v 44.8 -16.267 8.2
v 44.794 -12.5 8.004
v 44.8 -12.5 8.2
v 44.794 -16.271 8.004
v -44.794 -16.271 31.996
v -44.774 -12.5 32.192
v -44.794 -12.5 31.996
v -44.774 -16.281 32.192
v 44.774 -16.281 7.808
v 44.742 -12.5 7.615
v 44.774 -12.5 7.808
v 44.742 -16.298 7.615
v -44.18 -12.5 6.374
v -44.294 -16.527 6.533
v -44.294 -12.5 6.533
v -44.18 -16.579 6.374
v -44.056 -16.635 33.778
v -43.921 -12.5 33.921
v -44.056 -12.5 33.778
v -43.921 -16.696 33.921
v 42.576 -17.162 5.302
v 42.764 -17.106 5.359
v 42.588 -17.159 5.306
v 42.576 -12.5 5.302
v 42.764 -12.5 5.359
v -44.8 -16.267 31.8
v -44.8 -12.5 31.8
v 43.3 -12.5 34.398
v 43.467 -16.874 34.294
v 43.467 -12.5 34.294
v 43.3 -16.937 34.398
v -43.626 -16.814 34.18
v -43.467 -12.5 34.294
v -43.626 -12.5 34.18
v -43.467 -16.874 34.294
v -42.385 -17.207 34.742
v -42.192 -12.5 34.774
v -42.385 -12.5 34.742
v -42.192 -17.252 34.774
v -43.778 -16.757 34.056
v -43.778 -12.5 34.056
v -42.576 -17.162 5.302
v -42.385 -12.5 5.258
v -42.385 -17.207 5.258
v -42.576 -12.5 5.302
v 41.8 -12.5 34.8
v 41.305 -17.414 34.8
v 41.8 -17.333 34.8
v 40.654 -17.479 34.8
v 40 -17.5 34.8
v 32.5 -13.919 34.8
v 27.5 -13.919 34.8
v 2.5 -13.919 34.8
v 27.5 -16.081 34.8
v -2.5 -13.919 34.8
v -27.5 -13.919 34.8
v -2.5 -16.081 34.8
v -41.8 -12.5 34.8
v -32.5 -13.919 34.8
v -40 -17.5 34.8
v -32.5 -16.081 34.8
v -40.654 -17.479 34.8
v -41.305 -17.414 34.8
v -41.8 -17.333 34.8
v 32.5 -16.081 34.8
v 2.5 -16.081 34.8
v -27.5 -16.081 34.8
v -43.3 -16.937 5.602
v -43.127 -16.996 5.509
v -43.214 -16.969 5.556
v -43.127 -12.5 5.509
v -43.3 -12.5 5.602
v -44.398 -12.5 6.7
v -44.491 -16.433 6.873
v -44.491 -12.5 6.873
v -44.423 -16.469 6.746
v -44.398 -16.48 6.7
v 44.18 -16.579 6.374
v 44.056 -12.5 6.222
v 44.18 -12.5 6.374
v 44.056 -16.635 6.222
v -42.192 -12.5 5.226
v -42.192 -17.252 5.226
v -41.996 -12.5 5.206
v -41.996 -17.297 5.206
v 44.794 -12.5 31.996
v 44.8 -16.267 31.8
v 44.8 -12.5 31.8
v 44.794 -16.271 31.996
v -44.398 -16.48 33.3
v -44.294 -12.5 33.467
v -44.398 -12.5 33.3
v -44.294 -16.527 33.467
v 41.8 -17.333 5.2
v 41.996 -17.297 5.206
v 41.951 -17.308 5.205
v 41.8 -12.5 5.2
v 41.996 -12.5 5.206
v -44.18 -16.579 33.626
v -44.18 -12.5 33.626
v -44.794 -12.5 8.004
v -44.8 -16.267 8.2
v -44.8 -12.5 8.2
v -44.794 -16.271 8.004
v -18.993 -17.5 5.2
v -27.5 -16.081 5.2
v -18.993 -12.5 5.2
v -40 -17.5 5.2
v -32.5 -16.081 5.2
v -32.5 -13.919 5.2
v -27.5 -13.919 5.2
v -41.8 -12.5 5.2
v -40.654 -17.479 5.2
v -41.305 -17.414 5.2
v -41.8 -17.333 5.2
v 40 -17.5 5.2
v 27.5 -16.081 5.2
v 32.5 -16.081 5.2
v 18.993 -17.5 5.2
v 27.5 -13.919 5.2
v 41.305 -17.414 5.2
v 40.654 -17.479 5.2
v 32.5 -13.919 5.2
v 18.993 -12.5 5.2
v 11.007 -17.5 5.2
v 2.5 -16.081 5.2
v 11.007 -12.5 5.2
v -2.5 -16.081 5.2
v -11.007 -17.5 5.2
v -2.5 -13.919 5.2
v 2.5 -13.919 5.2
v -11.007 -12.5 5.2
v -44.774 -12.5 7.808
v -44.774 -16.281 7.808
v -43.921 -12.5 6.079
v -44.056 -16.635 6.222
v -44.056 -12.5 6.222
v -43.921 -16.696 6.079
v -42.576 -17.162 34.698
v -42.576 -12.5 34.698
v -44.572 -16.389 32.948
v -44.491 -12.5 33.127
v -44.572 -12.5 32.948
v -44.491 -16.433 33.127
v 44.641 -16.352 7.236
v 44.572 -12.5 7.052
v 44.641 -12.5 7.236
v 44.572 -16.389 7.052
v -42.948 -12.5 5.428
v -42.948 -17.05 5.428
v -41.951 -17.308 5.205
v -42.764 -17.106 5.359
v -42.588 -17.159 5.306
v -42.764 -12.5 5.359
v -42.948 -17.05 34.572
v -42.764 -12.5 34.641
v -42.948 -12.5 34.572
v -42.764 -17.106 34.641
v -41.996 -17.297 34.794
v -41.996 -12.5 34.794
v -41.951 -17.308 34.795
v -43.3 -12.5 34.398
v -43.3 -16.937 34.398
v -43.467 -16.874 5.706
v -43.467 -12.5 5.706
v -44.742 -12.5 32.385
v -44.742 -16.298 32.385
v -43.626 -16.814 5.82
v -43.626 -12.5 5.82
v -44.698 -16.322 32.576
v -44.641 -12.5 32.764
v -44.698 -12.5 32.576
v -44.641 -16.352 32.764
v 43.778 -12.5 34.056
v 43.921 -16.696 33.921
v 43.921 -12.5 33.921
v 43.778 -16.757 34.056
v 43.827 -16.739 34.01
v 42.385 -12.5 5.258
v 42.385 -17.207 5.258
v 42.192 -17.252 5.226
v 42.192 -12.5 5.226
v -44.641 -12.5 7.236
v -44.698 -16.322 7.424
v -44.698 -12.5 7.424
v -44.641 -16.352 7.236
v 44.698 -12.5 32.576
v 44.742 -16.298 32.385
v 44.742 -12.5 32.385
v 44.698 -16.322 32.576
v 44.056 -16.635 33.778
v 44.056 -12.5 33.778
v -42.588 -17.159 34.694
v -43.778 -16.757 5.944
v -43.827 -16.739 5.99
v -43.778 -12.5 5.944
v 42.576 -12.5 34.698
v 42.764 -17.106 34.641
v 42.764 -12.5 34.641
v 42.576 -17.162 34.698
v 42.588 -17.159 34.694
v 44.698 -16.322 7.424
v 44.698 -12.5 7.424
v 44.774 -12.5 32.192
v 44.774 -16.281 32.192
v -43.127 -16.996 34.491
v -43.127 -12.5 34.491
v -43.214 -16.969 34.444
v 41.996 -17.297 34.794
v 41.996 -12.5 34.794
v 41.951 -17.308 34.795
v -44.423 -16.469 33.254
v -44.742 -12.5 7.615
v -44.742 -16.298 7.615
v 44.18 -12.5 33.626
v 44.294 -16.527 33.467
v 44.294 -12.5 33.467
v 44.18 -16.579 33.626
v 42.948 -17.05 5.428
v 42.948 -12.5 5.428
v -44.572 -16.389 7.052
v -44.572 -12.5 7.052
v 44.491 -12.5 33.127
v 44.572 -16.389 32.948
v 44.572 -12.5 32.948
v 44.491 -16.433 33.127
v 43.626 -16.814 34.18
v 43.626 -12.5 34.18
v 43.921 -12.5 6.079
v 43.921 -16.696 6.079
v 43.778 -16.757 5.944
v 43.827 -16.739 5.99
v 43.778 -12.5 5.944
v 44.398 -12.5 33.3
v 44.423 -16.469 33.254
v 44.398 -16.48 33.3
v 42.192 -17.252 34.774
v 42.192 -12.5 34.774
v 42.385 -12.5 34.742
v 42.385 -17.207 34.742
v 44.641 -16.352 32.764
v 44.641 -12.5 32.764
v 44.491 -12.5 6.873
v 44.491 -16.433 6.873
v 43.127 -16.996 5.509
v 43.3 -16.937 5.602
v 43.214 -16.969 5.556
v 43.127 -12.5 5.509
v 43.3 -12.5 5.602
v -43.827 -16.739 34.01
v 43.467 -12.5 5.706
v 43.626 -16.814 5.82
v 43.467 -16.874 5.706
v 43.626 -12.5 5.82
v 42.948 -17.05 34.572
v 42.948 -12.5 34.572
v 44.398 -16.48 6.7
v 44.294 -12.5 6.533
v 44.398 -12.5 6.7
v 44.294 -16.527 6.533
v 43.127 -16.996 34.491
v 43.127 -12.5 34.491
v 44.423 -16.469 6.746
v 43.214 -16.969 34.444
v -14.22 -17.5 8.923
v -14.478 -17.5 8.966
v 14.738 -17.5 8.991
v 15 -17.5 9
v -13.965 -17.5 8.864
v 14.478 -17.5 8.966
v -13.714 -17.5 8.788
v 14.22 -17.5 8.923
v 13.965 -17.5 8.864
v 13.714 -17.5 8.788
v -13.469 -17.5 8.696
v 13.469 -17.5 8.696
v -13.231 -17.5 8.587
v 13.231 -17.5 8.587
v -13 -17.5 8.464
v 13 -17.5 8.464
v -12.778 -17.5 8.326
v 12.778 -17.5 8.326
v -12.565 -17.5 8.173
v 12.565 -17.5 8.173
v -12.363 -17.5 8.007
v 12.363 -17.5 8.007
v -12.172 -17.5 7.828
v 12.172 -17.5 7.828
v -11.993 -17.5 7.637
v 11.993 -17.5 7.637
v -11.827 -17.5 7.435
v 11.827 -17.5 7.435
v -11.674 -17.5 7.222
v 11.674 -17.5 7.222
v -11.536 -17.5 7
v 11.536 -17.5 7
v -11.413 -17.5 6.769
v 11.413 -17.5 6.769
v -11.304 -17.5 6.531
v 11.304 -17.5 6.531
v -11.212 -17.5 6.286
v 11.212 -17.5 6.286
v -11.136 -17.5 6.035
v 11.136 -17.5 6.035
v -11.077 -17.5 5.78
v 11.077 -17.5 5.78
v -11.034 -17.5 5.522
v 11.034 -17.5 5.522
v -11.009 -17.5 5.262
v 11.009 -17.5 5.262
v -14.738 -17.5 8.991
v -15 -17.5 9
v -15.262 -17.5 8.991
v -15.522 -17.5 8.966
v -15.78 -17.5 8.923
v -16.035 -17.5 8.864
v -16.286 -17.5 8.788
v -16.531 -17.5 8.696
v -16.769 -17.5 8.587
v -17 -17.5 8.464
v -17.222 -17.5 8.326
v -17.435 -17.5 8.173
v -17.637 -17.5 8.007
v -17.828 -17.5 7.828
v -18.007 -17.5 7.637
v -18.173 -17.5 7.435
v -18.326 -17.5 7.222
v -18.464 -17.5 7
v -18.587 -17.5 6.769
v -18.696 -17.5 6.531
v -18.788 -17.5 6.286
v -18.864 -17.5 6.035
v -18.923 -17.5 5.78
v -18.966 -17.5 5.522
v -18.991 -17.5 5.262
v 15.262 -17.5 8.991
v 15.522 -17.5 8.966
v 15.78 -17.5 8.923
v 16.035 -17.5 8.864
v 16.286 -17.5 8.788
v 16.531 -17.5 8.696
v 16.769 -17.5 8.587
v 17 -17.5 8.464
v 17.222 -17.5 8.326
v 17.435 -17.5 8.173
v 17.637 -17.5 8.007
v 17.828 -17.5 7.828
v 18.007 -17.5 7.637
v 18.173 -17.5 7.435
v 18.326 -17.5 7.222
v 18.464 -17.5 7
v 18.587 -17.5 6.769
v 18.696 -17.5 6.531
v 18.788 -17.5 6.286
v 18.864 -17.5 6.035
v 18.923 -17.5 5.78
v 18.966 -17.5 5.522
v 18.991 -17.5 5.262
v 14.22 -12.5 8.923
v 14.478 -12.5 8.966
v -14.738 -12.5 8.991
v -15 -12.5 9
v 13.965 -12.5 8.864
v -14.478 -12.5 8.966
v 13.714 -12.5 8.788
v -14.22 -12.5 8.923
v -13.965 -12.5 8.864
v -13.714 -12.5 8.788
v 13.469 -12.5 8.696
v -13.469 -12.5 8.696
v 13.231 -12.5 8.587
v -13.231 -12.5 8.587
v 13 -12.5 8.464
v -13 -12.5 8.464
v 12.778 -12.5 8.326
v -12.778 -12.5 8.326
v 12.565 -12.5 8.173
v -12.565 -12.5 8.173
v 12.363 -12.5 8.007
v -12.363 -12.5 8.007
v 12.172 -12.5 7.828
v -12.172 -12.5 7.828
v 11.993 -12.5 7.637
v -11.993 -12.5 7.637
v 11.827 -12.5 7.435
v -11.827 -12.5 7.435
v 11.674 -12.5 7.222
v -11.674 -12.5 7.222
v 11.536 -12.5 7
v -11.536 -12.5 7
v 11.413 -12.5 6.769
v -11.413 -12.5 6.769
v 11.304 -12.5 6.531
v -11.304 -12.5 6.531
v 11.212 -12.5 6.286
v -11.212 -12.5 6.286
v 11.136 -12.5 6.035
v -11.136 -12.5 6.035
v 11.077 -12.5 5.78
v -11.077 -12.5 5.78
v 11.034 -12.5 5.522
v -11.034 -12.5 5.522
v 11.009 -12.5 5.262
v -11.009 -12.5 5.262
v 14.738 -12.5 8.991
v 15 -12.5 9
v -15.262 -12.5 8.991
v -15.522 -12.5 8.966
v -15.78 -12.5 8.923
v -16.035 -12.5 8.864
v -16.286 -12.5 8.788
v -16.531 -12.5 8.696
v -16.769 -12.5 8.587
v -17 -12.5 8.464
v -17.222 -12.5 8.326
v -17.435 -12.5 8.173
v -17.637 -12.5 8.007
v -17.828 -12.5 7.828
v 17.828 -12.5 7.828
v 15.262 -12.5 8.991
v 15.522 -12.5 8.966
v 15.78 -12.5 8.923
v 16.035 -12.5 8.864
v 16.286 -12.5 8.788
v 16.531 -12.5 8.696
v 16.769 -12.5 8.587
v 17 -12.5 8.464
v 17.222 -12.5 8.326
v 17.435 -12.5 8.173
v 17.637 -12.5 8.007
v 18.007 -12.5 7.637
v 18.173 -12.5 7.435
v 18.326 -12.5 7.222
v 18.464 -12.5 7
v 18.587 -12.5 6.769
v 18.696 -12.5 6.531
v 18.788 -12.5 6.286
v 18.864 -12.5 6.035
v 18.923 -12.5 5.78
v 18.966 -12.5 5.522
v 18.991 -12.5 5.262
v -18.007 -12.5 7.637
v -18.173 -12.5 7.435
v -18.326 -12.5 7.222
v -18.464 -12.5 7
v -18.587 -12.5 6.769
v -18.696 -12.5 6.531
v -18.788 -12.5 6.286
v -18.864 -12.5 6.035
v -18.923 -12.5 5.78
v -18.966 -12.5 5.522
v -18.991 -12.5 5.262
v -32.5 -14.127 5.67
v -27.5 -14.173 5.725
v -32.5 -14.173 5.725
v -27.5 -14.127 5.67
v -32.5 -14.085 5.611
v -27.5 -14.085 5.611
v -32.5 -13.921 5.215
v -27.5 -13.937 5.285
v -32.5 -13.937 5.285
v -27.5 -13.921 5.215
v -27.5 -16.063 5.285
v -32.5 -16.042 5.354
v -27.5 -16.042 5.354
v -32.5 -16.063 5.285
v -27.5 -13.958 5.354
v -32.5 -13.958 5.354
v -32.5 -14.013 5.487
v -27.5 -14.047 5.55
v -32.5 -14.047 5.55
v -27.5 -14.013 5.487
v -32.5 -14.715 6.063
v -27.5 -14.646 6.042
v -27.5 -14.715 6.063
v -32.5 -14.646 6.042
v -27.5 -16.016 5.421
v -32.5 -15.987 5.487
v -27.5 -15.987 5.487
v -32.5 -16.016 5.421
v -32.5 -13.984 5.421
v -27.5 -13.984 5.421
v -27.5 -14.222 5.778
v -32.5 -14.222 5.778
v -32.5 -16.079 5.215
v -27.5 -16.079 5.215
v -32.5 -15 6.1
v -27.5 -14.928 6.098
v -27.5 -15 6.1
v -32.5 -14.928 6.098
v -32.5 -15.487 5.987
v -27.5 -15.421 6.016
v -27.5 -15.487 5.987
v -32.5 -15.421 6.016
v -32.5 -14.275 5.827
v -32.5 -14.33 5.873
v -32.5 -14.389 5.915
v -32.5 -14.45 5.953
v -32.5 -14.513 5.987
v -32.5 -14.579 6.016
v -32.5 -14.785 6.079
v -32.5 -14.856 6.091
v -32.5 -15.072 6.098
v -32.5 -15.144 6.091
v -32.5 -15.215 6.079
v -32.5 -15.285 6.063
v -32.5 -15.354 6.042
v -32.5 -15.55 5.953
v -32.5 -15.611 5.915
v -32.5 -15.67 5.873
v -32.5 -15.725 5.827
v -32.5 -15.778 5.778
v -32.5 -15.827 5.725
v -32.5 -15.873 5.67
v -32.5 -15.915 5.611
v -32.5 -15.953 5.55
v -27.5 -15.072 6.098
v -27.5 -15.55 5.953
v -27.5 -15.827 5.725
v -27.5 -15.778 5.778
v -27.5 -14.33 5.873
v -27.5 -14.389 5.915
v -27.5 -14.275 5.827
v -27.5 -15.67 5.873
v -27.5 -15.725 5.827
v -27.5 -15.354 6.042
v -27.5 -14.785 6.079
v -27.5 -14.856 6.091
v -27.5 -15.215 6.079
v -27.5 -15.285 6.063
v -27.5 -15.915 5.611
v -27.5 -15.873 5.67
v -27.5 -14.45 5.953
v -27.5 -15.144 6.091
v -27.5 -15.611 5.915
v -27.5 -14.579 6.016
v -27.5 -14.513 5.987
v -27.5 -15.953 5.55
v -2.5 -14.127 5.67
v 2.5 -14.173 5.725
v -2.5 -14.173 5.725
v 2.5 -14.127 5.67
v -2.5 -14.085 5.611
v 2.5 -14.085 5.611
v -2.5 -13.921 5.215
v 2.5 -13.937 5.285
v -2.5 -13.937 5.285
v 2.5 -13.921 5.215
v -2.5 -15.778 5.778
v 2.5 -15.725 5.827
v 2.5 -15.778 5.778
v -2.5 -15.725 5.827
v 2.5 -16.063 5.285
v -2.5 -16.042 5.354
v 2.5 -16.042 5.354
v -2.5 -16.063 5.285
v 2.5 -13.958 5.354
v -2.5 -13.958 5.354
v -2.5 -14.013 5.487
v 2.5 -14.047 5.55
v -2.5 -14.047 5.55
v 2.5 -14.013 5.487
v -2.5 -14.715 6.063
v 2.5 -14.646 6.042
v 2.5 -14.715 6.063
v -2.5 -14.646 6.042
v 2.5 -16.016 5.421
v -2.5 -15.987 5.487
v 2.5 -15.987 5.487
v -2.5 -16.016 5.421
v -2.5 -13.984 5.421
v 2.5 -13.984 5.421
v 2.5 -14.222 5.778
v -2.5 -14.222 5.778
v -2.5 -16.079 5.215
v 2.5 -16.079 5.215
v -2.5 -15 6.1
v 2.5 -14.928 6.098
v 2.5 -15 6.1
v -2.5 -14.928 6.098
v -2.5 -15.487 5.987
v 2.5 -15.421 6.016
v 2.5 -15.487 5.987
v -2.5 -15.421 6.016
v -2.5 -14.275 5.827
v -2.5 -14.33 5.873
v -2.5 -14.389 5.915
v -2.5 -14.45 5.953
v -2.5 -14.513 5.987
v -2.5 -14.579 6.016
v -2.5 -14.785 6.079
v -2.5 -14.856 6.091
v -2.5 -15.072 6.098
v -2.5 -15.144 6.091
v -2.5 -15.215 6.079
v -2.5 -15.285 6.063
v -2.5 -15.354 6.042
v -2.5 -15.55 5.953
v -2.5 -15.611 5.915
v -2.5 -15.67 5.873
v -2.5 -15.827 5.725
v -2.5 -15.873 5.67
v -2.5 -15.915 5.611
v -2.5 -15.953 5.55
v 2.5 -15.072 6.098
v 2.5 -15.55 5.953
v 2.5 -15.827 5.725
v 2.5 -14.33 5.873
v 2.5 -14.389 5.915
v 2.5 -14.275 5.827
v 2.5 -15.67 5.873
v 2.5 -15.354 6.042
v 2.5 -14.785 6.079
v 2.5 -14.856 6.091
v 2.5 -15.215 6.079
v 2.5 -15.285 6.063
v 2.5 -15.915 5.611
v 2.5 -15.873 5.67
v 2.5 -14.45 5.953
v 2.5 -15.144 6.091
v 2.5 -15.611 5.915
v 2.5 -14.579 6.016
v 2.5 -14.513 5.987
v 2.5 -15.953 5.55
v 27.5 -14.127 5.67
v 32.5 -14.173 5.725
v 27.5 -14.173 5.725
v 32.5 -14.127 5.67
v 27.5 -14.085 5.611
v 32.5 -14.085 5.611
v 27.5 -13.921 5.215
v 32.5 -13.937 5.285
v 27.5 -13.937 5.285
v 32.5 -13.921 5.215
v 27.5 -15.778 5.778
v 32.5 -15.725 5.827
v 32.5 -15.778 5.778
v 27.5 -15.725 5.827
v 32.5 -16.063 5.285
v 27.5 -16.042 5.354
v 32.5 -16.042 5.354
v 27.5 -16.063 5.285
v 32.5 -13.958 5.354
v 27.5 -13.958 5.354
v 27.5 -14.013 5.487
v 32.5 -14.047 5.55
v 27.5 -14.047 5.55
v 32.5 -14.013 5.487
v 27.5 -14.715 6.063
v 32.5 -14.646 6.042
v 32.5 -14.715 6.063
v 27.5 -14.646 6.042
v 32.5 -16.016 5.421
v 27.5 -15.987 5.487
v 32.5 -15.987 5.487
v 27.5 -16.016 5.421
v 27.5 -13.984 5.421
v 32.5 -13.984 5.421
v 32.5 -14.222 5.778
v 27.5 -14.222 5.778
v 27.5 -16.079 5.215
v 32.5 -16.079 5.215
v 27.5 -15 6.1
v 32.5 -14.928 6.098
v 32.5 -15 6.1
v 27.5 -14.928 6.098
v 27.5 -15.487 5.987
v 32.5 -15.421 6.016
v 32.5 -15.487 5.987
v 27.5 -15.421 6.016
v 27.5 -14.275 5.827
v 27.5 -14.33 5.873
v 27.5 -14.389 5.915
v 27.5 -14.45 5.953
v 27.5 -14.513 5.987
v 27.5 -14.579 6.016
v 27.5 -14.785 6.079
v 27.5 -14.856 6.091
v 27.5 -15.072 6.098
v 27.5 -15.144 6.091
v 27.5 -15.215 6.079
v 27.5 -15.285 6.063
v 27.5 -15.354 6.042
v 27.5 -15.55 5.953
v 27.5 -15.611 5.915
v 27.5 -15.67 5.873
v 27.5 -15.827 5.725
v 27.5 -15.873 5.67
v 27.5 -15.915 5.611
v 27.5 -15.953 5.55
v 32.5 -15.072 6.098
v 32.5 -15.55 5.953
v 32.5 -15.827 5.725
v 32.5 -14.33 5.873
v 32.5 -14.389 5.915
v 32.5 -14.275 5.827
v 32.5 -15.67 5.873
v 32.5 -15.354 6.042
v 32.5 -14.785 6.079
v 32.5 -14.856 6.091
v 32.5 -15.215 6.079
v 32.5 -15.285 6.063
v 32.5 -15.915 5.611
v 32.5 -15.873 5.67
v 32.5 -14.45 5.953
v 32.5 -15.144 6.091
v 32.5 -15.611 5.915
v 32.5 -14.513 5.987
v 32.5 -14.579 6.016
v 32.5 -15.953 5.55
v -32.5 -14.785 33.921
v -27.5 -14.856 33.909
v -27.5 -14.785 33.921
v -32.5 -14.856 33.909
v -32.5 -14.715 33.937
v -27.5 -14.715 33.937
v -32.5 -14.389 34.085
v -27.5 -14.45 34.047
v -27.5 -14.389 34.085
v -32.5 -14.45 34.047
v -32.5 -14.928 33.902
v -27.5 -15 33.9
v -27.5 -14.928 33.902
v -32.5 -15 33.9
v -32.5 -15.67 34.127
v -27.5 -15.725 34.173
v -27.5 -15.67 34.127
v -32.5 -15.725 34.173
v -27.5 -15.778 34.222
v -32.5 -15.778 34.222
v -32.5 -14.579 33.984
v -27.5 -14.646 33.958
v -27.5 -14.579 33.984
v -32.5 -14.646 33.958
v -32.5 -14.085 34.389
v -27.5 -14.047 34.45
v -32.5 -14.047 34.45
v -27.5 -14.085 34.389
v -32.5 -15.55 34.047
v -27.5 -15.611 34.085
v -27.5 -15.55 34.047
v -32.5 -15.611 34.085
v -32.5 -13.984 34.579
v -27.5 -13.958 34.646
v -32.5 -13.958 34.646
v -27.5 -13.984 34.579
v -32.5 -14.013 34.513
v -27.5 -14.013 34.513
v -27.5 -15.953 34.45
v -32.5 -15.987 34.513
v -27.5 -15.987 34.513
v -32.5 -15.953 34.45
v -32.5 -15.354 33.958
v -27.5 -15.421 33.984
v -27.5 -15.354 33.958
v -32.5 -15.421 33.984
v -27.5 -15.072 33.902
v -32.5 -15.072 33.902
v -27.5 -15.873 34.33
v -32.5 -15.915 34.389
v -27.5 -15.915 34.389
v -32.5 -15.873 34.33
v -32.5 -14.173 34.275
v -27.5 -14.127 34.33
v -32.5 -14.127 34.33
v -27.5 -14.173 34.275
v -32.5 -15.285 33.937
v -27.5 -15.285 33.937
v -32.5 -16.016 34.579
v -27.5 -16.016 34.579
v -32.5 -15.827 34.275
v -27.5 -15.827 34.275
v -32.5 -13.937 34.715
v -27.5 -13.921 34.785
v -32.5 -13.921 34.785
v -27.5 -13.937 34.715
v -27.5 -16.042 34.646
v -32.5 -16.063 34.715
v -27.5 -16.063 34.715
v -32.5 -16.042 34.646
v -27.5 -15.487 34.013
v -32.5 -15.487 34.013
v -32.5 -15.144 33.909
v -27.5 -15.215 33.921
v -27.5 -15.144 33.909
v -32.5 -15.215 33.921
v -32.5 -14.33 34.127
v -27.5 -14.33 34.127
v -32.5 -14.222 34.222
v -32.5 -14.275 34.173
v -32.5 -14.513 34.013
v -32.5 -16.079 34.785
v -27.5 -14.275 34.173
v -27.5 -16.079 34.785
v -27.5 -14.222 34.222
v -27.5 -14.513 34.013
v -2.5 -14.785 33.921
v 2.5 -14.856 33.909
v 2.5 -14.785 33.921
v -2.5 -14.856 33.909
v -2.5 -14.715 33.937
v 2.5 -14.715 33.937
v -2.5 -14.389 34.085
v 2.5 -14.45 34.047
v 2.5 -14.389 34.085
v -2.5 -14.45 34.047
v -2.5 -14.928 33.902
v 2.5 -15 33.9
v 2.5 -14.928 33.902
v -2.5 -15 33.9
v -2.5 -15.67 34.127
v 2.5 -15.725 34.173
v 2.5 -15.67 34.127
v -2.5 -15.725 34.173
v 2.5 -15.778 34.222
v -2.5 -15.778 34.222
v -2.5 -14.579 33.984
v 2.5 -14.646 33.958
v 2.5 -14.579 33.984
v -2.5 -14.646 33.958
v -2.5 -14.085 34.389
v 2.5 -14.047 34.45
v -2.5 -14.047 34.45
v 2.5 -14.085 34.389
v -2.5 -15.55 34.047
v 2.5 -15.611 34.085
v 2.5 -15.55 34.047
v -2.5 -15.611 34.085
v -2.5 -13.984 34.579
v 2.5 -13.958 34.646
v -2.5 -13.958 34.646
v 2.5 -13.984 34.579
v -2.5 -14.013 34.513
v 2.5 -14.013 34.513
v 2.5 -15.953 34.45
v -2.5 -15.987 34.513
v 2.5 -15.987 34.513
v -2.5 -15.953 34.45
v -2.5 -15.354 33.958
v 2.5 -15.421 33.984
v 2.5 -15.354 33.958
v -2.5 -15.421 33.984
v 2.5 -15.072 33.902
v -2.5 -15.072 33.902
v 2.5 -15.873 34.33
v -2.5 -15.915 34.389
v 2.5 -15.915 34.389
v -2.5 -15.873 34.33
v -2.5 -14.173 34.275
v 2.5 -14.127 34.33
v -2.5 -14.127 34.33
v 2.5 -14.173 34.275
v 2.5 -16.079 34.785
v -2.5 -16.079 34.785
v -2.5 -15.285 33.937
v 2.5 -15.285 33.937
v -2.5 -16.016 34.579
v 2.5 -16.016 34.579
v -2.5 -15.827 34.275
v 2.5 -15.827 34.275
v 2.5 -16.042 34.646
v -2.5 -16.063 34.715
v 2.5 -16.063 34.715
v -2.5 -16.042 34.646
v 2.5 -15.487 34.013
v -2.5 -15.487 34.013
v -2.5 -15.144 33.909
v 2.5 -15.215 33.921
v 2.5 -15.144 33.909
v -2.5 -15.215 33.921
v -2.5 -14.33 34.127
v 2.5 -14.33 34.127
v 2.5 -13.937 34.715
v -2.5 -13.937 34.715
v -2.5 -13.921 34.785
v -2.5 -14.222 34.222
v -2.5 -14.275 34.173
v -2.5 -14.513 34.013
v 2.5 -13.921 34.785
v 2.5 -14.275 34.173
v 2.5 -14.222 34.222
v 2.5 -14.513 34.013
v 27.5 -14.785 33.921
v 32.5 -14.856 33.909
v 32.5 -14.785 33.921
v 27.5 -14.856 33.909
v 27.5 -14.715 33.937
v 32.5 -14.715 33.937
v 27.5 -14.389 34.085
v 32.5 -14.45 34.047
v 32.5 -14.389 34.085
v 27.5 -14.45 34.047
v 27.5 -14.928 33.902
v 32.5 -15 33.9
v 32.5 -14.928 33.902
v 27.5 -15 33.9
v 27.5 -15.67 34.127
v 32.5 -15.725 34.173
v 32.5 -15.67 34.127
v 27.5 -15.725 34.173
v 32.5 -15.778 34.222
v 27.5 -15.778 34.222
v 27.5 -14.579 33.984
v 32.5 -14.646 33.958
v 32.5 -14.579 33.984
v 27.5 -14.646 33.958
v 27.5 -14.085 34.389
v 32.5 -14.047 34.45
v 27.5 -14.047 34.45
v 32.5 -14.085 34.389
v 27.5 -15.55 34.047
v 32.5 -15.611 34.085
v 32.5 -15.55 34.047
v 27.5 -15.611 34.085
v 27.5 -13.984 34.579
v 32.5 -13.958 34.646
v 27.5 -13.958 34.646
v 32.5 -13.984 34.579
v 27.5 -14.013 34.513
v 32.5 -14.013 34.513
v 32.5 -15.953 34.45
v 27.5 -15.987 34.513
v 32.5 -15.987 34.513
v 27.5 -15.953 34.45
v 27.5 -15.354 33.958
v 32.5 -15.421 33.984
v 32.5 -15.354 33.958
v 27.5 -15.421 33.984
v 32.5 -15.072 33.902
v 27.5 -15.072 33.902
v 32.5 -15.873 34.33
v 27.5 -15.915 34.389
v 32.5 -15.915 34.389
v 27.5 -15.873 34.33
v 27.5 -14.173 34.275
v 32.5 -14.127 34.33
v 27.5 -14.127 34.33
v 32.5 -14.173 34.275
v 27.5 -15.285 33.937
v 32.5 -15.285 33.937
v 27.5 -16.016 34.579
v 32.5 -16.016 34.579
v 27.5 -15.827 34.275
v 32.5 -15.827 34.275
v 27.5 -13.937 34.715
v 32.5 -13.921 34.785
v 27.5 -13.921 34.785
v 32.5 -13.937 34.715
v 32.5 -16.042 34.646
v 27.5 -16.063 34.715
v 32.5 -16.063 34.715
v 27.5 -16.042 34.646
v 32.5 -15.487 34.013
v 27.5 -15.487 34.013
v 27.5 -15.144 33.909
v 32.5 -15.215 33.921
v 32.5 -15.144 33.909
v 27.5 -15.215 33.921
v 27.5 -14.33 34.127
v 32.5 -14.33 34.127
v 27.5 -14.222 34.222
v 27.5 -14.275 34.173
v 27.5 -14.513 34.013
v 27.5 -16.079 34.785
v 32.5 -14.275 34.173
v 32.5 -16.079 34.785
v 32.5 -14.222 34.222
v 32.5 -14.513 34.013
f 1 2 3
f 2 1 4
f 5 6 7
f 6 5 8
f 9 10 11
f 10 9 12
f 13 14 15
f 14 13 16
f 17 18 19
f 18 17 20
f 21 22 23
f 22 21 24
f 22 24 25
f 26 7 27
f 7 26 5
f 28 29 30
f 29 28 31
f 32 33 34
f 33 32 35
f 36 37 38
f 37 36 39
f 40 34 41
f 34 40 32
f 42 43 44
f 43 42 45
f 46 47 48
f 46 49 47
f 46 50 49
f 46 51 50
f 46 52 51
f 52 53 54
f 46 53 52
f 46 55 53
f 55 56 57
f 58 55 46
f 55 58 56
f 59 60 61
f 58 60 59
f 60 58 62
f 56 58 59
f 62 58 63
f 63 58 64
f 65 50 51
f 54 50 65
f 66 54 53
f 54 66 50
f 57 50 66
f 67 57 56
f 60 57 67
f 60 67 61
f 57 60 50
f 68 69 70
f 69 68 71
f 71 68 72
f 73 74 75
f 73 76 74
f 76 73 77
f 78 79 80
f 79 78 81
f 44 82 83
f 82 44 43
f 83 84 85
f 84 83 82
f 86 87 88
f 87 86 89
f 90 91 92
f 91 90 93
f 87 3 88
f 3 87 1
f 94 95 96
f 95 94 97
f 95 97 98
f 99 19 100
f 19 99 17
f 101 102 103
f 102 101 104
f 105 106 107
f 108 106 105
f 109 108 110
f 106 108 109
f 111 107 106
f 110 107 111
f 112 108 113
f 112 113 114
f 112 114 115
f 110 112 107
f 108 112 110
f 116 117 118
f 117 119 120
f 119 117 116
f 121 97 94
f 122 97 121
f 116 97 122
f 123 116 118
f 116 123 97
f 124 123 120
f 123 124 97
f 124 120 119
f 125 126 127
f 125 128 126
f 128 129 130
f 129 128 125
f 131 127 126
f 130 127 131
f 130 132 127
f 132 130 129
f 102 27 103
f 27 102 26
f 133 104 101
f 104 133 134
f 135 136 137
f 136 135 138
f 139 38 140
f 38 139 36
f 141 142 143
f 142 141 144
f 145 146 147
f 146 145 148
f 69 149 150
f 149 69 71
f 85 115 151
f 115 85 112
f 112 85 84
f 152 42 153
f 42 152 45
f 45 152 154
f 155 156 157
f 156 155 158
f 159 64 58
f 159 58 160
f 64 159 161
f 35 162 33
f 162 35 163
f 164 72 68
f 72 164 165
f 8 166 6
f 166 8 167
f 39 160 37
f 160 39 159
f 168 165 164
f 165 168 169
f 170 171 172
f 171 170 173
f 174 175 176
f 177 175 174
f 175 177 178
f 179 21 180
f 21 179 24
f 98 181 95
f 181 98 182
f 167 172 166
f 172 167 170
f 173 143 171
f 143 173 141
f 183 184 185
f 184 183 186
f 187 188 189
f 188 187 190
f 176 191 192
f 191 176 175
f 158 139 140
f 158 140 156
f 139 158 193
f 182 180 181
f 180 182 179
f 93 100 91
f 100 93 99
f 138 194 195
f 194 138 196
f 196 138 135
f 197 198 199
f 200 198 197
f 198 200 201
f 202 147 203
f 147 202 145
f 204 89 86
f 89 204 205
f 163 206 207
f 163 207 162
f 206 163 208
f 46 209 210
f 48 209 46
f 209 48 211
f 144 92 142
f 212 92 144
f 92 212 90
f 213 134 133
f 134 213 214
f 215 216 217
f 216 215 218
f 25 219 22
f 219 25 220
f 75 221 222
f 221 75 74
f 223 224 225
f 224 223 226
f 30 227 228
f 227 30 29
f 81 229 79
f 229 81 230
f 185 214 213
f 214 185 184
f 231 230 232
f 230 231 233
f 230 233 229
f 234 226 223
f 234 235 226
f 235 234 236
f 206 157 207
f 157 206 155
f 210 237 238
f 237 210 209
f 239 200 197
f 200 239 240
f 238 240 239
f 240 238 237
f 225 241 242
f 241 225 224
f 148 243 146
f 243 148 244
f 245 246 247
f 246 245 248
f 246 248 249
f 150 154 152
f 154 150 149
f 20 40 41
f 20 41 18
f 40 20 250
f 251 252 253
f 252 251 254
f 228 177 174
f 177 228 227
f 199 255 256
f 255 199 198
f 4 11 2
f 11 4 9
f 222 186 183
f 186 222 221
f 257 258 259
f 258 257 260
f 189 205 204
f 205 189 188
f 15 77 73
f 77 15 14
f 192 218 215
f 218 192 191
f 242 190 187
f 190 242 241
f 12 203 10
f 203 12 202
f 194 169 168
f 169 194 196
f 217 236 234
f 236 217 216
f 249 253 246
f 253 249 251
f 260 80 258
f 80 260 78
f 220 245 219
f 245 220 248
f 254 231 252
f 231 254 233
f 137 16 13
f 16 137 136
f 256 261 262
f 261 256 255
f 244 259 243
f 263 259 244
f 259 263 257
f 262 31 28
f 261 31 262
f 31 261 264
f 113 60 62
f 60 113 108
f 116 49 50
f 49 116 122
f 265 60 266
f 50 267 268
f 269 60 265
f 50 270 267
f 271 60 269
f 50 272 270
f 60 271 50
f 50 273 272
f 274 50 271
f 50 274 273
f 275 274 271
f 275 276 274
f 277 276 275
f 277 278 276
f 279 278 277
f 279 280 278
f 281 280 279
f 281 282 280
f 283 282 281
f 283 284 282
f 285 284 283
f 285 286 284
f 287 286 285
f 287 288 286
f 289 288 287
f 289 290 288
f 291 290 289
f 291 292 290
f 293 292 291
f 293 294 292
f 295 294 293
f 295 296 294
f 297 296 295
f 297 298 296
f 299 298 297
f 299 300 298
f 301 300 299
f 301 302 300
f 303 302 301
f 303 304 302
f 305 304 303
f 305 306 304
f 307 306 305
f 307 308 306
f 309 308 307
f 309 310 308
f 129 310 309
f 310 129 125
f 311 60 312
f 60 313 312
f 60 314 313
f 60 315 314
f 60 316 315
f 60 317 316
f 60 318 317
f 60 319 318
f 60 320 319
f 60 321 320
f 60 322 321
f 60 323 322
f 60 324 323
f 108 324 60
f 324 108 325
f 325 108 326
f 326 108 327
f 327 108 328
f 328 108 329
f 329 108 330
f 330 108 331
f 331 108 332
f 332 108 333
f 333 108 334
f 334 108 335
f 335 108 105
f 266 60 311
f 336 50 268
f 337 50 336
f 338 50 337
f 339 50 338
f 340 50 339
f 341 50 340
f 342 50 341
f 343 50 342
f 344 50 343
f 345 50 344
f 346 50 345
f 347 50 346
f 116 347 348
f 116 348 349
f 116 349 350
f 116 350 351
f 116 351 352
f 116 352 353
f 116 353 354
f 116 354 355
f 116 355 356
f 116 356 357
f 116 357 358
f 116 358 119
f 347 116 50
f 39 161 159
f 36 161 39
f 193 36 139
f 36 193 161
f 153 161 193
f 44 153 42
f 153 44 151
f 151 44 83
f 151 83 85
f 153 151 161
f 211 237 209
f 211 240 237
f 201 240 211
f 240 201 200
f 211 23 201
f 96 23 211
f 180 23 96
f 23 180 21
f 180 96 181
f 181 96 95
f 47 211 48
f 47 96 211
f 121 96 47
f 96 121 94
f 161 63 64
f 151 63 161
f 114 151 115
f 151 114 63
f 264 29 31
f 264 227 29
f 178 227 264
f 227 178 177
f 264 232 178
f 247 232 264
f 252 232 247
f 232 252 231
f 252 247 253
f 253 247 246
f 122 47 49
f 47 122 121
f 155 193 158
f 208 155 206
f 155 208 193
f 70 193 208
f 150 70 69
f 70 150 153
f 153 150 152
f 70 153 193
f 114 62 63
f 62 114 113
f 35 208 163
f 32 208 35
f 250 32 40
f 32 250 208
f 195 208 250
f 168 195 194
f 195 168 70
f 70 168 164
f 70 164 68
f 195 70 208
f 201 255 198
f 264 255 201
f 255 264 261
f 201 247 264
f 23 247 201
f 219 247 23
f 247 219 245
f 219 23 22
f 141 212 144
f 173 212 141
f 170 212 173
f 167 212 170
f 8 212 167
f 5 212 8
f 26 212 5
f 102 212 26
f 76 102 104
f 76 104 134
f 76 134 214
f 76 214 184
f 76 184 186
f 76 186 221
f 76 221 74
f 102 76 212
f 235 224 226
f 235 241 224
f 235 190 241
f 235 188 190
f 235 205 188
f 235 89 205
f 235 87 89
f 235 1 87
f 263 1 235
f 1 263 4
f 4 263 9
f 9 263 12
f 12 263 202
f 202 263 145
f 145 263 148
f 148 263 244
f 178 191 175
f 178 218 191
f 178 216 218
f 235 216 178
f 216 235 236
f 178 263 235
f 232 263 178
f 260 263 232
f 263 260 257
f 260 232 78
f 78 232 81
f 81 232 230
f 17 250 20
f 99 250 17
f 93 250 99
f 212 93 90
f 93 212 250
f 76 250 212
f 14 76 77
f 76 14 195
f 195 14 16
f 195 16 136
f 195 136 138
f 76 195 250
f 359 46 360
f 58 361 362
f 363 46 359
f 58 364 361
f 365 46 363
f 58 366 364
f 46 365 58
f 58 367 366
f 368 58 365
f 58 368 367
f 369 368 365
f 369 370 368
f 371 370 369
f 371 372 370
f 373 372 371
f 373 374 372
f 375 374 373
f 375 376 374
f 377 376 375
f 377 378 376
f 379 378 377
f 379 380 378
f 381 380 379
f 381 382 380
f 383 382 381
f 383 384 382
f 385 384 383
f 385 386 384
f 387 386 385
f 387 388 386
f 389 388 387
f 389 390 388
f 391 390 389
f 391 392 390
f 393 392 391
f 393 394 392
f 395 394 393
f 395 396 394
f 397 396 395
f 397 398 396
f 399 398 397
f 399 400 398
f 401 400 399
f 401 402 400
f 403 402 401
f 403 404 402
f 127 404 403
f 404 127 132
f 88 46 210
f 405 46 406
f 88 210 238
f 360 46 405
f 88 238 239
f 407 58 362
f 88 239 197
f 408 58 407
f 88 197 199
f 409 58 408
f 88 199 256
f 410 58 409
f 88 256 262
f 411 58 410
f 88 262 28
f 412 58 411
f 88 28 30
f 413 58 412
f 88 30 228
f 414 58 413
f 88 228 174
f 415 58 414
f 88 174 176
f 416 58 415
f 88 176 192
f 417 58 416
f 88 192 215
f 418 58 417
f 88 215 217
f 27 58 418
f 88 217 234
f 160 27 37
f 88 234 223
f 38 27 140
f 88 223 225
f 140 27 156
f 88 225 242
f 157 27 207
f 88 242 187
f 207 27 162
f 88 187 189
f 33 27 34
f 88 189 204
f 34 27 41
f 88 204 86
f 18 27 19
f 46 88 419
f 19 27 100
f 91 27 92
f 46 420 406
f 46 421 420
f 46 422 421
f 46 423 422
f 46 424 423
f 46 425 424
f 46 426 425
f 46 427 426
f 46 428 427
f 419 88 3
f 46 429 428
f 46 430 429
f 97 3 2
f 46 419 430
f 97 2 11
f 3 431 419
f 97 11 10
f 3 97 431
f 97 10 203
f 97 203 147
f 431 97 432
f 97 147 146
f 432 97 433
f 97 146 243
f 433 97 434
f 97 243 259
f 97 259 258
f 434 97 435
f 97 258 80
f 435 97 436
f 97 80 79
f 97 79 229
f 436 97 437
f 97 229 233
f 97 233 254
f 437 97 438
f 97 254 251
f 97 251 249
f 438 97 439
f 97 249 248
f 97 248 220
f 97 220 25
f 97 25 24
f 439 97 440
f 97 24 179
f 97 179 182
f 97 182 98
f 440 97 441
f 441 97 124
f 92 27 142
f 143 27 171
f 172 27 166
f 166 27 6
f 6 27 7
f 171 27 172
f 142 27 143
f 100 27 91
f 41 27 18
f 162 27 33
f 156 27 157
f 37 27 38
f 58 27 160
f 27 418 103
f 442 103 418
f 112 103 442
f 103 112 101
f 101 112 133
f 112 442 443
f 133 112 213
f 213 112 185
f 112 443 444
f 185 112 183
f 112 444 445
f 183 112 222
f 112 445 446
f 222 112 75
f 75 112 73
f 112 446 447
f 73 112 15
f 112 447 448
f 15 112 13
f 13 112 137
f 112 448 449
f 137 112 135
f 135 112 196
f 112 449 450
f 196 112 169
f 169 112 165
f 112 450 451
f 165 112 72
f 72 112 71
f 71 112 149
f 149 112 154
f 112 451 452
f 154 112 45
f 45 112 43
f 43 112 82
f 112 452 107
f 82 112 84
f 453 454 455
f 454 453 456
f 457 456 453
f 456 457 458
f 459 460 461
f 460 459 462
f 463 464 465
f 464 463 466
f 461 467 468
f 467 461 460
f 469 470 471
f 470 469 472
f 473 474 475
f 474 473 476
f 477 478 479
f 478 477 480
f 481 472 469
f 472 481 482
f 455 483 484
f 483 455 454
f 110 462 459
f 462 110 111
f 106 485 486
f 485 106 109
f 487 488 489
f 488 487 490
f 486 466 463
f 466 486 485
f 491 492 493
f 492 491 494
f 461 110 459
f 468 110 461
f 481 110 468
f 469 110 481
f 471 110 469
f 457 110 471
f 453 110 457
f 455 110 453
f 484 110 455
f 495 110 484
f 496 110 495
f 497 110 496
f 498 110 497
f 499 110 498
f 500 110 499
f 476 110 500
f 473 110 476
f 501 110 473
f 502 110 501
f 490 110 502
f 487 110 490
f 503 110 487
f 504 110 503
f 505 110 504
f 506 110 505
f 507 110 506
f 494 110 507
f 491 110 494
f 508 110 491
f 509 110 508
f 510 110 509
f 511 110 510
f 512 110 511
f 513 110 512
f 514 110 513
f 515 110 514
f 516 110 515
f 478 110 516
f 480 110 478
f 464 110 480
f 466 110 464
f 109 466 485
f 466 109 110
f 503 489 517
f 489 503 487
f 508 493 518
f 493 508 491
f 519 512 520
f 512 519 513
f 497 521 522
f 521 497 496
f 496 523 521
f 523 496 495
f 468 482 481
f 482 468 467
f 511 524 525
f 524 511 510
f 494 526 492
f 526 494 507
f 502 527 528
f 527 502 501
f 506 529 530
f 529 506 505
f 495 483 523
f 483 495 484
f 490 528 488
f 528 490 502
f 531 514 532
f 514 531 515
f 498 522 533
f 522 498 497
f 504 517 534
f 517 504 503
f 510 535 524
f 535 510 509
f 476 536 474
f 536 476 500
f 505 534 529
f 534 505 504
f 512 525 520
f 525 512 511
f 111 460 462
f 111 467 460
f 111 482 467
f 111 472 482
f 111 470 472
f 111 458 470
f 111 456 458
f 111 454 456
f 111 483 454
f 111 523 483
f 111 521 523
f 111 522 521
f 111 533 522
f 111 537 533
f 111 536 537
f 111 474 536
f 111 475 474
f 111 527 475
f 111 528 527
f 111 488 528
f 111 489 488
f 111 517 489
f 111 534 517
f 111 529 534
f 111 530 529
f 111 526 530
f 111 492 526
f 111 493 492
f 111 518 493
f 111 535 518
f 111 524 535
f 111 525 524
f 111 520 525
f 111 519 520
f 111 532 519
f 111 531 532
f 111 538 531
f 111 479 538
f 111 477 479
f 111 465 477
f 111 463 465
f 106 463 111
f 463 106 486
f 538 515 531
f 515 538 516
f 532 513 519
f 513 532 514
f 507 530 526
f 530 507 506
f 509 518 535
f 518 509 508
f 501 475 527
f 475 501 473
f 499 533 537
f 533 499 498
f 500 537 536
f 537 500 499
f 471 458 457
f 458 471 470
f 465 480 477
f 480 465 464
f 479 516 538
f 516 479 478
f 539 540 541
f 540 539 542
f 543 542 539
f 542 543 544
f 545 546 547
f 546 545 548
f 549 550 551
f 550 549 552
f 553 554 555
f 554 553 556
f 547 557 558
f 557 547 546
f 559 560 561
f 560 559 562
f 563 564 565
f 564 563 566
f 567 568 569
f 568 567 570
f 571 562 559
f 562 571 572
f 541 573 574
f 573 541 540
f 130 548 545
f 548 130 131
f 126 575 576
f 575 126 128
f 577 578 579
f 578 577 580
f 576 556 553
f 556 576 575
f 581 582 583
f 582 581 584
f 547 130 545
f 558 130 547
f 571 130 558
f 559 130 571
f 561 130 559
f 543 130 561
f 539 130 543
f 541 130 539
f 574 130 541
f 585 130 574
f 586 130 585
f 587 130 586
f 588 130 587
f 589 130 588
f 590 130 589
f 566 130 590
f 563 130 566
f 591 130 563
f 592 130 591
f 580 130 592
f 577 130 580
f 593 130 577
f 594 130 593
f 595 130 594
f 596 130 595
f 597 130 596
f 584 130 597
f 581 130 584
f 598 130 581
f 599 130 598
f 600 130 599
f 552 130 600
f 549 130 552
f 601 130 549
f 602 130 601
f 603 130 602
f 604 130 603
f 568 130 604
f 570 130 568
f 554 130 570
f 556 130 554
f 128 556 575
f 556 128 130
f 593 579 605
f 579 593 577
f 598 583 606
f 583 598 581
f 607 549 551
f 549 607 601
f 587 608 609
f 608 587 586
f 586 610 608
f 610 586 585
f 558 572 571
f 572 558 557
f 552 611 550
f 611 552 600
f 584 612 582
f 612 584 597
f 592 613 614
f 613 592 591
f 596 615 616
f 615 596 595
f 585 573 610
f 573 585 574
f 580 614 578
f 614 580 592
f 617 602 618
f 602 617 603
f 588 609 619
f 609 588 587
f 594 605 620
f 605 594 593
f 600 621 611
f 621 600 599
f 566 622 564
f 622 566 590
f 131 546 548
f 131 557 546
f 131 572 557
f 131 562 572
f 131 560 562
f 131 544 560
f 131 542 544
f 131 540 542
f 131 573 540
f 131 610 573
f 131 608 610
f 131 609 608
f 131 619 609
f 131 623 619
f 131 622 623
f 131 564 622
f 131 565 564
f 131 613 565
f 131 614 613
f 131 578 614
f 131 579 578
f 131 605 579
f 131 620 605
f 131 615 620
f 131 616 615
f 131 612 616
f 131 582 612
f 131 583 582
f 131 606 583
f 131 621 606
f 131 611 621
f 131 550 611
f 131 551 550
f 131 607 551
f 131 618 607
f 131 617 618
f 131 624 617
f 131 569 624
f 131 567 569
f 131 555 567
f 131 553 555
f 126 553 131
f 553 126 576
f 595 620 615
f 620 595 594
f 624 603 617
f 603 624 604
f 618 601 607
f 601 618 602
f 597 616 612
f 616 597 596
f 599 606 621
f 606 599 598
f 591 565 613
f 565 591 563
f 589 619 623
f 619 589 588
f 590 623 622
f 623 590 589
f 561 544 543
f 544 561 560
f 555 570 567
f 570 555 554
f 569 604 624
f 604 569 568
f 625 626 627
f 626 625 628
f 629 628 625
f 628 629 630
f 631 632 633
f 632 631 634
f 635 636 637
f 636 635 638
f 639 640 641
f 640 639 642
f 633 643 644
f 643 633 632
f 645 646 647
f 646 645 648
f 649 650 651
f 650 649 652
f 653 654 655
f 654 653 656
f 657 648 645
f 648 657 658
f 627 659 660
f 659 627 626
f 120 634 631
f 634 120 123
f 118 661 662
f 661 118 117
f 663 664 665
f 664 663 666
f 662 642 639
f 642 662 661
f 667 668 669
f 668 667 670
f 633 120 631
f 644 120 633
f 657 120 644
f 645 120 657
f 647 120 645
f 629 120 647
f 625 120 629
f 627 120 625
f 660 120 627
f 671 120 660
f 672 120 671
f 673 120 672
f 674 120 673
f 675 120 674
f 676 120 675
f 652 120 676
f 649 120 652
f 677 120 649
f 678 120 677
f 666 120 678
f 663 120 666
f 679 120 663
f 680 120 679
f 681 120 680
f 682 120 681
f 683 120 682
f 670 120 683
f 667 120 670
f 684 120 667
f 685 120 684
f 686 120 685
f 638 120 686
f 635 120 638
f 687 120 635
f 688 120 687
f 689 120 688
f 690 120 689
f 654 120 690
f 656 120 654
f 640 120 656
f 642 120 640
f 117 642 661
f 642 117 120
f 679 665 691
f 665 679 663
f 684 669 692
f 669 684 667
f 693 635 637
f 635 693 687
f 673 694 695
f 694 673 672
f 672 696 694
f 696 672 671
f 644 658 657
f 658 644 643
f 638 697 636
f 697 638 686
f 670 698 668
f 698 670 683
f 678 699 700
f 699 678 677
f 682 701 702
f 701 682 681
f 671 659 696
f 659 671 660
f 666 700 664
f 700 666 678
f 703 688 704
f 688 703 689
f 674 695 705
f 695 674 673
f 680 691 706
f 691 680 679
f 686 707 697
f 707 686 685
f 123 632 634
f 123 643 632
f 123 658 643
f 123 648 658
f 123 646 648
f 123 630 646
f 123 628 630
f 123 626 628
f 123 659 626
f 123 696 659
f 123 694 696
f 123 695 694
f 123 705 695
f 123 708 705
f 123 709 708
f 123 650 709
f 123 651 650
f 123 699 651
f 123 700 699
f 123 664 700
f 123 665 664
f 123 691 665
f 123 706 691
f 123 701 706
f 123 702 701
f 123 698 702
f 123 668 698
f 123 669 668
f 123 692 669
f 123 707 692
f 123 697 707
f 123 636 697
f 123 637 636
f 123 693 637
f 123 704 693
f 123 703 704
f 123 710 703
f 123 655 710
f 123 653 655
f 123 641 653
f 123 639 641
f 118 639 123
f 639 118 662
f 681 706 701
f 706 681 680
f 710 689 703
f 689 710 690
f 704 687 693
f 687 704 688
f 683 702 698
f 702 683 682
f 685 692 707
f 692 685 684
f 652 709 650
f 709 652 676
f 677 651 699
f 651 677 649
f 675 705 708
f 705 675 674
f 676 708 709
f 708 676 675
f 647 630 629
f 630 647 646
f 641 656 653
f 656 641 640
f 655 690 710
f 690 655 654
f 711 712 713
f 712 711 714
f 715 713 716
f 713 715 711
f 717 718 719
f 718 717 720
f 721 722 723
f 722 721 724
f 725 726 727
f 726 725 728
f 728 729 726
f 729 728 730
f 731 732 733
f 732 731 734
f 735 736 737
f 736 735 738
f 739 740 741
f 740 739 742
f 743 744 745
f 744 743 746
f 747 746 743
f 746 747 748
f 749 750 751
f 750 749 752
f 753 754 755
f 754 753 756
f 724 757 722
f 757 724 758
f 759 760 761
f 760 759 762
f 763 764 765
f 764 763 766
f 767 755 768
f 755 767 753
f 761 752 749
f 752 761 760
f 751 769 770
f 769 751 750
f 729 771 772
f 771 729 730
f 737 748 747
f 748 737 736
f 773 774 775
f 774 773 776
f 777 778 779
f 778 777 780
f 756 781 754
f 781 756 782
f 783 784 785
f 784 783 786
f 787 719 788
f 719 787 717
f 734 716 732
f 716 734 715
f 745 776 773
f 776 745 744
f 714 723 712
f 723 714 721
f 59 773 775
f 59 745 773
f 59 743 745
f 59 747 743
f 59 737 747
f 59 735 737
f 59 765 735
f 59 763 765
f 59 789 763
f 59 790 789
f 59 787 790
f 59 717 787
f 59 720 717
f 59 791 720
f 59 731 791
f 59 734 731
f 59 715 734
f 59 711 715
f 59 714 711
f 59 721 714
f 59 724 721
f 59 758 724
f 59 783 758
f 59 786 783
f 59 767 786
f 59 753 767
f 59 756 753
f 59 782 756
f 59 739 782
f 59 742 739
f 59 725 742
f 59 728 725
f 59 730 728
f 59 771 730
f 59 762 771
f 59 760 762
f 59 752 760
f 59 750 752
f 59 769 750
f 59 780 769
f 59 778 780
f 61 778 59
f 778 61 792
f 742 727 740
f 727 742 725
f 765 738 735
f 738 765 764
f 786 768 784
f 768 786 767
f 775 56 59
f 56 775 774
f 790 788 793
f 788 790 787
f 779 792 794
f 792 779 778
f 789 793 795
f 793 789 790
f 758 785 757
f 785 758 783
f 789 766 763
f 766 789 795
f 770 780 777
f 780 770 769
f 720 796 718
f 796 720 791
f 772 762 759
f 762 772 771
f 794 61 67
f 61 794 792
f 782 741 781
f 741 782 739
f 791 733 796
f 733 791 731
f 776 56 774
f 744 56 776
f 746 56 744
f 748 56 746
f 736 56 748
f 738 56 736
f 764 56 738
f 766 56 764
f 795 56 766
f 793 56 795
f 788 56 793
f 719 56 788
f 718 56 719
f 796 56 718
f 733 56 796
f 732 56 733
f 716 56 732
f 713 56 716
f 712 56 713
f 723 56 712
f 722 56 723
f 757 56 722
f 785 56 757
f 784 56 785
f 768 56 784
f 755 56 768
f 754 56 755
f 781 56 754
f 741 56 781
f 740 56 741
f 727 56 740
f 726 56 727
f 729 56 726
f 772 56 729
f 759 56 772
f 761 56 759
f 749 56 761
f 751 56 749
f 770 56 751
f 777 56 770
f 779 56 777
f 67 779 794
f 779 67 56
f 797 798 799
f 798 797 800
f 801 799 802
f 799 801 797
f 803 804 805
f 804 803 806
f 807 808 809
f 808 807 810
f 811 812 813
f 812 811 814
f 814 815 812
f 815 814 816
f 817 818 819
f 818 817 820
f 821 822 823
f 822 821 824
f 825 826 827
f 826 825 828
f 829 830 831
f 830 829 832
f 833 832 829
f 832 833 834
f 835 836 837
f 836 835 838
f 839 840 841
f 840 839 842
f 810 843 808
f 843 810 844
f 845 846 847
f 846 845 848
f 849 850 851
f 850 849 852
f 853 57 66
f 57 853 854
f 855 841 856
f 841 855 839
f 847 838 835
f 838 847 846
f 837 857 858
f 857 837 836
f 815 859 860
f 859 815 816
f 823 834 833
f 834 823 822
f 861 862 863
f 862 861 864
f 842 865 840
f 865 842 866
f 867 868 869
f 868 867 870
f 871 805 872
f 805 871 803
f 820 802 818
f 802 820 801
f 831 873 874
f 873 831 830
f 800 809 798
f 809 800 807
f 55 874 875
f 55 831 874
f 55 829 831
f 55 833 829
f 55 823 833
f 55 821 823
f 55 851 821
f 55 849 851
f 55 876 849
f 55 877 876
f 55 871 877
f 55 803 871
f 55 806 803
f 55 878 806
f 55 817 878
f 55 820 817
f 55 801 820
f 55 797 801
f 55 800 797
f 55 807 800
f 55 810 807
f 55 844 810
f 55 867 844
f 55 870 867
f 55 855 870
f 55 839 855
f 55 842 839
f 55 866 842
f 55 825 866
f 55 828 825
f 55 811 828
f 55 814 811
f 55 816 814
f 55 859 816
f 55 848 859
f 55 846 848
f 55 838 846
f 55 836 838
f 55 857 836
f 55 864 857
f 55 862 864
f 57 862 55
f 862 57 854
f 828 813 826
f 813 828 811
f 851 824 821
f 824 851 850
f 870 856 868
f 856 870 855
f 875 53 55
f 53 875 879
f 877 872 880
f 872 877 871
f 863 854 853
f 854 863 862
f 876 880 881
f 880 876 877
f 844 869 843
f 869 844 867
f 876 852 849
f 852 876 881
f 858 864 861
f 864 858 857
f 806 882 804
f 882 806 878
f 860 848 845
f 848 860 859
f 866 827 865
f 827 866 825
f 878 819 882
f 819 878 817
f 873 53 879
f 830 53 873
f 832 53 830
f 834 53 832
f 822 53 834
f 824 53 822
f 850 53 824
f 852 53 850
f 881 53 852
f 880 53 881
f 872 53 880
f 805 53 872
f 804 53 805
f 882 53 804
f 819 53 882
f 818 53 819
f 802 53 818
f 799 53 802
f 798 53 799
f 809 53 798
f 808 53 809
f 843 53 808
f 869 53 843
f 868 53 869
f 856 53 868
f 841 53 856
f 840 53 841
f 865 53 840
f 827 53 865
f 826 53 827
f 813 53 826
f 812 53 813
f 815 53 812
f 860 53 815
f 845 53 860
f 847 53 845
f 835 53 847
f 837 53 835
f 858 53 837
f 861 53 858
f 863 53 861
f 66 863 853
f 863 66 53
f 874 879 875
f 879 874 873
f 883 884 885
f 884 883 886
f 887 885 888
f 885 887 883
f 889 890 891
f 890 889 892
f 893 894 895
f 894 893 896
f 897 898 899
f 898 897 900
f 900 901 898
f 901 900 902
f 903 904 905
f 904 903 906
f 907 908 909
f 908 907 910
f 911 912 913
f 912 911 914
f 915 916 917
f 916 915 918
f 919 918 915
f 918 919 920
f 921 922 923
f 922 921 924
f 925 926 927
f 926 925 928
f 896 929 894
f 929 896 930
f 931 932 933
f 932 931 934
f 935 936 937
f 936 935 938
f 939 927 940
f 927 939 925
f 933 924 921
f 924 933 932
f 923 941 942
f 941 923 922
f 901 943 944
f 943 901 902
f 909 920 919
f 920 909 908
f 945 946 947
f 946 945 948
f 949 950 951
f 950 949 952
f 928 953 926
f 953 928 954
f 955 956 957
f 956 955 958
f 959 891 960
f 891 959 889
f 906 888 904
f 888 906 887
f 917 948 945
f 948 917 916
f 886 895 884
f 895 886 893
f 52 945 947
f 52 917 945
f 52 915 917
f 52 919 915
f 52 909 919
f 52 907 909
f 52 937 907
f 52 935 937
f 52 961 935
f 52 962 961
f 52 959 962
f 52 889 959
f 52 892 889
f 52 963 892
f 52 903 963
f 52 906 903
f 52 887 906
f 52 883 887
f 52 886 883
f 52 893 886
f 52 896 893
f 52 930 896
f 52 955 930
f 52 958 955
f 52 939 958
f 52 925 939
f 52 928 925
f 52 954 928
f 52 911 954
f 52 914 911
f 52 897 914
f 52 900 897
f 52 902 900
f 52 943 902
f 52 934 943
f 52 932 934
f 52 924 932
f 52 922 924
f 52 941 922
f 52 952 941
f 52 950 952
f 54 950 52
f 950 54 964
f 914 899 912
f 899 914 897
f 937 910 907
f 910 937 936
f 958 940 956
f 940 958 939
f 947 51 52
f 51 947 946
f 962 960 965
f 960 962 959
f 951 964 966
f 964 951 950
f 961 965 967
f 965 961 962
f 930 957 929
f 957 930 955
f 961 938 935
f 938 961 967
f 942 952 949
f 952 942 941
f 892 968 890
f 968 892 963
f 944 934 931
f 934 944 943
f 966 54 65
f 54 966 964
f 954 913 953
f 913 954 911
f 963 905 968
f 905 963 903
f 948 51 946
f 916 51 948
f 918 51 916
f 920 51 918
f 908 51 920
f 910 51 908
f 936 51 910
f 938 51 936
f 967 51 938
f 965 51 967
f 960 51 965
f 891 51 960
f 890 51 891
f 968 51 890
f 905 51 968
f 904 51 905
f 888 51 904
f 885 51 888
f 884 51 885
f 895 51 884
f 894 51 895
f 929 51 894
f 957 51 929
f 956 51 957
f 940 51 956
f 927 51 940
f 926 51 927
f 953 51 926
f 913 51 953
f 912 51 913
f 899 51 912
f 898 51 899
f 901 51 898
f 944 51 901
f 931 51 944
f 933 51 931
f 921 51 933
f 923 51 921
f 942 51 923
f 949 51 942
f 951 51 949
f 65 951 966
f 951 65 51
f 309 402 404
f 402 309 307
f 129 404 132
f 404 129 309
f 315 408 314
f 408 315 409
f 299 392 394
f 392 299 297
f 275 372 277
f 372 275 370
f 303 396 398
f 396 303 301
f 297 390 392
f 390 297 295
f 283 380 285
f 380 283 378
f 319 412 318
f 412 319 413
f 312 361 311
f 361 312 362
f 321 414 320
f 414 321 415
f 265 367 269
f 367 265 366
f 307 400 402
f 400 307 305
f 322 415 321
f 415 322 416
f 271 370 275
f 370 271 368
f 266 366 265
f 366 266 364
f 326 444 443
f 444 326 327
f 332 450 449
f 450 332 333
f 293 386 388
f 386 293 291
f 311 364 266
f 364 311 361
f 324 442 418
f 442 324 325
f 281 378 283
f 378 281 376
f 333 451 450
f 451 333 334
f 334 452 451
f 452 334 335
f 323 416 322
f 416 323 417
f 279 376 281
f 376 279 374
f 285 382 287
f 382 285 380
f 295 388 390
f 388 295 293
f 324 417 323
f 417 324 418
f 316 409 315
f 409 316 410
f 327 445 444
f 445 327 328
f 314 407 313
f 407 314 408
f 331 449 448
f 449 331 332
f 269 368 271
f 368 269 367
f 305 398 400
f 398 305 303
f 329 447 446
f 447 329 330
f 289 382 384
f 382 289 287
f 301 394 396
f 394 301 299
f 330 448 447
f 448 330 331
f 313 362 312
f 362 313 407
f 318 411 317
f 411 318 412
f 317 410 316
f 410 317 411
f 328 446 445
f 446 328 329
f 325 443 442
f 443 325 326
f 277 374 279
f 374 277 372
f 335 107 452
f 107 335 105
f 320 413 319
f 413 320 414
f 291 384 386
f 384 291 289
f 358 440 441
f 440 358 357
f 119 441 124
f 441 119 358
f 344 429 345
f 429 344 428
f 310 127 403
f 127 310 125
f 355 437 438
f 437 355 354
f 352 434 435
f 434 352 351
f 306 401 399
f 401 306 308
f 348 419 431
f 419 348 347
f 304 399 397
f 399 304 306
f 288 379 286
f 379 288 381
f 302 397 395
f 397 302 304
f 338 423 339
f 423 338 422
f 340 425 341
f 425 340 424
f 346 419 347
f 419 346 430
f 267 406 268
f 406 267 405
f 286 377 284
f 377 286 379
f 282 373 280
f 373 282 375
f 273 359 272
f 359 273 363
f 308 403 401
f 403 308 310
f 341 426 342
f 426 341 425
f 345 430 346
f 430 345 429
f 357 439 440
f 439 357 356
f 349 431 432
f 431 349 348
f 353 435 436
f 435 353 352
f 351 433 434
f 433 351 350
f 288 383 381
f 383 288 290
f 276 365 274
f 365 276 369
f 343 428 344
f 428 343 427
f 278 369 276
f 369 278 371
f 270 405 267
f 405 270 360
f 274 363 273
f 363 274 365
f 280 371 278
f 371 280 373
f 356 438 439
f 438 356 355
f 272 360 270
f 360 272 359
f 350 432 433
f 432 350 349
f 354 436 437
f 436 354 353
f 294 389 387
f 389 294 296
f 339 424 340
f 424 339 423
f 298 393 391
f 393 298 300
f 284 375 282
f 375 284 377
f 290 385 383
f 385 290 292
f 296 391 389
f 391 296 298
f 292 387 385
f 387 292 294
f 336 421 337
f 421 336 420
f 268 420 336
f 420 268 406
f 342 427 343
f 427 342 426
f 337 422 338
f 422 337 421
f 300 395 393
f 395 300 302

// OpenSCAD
roundness = 20;
xsize = 100;
ysize = 35;
depth = 40;
$fn = 96;
sw_x = 19.8;
sw_y = 13;

module body()
{
  linear_extrude(height = depth)
  {
    hull()
    {
      for (yom=[-1, 1])
      {
        for (xom=[-1, 1])
        {
          translate([xom * (xsize - roundness) / 2, yom * (ysize - roundness) / 2])
            circle(d = roundness);
        }
      }
    }
  }
}

module leds()
{
  for (yo=[-9, 9])
  {
    //for (xo=[-30, -10, 10, 30])
    for (xo=[-36:18:36])
    {
      translate([xo, yo, depth-28])
      {
        cylinder(d=5, h=30);
      }
    }
  }
}

module inner(offs)
{
  hull()
  {
    for (zo=[8-offs, depth-8+offs])
    {
      for (xom=[-1, 1])
      {
        translate([xom*(xsize/2-8+offs), 0, zo])
        {
          rotate([90, 0, 0]) translate([0, 0, 3]) cylinder(d=6, h=ysize, center=true);
        }
      }
    }
  }
}

module drillholes()
{
  for (xo=[-36, -25, 25, 36])
  {
    translate([xo, 0, -1])
    {
      cylinder(d=5.5, h=30);
    }
  }
}

module switch()
{
  translate([xsize / 2 - sw_y / 2 - 8, ysize / 2, depth / 2])
  {
    cube([sw_y, 10, sw_x], center=true);
  }
}

module battery()
{
  translate([-8, 8, depth / 2 - 3]) rotate([0, 90, 0]) cylinder(d=18, h=65+5, center=true);
}

module zip()
{
  for (zo=[-7.5, 7.5])
  {
    for (xo=[-25, 25])
    {
      translate([xo - 8, ysize / 2, depth / 2 - 3 + zo]) cube([4, 10, 1.5], center=true);
    }
  }
}

module notch(offs)
{
  for (zo = [5, depth - 5])
  {
    for (xo = [-30, 0, 30])
    {
      translate([xo, -ysize/2 + 2.5, zo]) rotate([0, 90, 0]) cylinder(d=2+offs, h=5, center=true);
    }
  }
}

module cutout()
{
  for (xo = [-15, 15])
  {
    translate([xo, -ysize/2 + 2.5, 5]) rotate([90, 0, 0]) cylinder(d=8, h=10, center=true);
  }

}

module lamp()
{
  difference()
  {
    body();
    leds();
    inner(0);
    drillholes();
    switch();
    battery();
    zip();
  }
  
  notch(0);
}


module cover()
{
  difference()
  {
    intersection()
    {
      inner(-0.2);
      body();
      translate([-xsize/2, -ysize/2, 0]) cube([xsize, 5, depth]);
    }
    notch(0.2);
    cutout();
  }
}

//lamp();
cover();
